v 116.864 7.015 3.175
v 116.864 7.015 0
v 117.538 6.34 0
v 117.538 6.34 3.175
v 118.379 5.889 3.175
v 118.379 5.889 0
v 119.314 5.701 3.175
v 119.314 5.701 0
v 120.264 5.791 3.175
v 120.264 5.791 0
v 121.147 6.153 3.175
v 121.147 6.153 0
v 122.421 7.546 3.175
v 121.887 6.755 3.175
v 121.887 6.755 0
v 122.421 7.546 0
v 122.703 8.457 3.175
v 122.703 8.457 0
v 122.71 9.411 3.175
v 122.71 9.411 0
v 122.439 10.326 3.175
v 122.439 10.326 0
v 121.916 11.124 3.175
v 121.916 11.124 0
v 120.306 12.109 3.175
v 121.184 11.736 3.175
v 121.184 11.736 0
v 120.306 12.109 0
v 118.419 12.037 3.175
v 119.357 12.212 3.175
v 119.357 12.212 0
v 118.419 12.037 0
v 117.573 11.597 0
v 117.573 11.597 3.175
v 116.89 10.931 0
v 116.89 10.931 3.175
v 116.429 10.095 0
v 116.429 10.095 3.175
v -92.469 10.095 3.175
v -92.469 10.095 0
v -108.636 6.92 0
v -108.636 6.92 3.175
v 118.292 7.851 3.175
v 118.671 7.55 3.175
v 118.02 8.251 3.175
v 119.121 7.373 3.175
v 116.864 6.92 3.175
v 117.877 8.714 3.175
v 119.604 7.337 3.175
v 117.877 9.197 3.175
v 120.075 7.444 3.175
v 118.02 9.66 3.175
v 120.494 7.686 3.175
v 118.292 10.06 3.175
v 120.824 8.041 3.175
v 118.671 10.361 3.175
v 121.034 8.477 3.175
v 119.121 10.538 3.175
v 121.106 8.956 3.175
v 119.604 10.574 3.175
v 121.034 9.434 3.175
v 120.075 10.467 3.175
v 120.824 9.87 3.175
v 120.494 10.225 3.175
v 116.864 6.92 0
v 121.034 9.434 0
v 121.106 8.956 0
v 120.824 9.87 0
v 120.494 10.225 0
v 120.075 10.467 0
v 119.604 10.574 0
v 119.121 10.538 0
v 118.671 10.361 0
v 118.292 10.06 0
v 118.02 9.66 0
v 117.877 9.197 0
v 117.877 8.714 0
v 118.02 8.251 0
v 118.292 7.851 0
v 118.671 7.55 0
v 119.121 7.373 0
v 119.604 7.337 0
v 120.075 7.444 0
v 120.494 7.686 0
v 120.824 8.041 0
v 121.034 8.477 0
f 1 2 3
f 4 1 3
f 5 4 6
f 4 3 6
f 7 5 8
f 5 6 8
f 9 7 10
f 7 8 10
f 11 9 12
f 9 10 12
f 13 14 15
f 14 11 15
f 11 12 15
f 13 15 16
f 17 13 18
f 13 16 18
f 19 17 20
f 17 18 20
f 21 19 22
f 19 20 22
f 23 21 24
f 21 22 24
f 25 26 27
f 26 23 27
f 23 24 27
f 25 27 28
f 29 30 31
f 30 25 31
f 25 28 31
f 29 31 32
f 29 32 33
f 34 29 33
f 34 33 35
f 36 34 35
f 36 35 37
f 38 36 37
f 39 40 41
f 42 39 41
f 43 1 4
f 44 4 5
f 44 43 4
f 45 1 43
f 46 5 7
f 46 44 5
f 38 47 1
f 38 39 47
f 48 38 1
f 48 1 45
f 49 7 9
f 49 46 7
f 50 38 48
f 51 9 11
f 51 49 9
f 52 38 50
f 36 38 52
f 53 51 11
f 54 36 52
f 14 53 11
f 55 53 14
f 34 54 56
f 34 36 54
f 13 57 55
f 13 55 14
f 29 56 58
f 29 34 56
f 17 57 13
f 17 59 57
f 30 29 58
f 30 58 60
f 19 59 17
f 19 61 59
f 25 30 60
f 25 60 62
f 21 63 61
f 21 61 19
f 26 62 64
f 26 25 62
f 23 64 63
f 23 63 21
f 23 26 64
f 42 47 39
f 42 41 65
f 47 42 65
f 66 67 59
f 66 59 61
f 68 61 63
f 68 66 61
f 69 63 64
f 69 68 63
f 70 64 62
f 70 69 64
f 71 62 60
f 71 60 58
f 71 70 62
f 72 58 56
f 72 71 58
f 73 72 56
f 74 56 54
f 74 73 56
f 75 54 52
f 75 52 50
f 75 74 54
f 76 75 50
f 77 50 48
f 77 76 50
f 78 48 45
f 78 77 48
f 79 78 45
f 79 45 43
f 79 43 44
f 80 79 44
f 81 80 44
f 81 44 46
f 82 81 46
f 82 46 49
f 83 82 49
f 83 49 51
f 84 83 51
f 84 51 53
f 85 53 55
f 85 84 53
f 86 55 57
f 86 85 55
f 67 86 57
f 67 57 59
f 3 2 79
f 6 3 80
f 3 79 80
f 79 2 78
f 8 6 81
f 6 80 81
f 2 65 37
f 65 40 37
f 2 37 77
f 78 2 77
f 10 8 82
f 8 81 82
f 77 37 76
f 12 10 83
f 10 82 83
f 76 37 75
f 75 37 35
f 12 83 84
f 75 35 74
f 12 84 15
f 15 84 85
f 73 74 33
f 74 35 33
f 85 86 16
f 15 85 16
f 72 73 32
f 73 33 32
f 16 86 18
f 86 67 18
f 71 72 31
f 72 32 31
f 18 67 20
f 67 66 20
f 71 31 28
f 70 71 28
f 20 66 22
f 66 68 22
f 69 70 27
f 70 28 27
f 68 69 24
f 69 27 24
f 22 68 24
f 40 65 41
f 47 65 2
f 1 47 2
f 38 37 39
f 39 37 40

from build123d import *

# Parameters (mm, degrees)
F1_DEPTH = 3.175
F2_R     = 3.259298
F2_R_2   = 1.623439
F3_DEPTH = 3.175


with BuildPart() as f1:
    # F0 (on Top) → F1 (new body)
    with BuildSketch(Plane.XY):
        Polygon((116.863699, 10.095269), (-92.469156, 10.095269), (-108.635934, 6.920269), (116.863699, 6.920269), align=None)
    extrude(amount=F1_DEPTH)

    # F2 (on Top) → F3 (join)
    with BuildSketch(Plane.XY):
        with Locations((119.482264, 8.955535)):
            Circle(F2_R)
        with Locations((119.482264, 8.955535)):
            Circle(F2_R_2, mode=Mode.SUBTRACT)
    extrude(amount=F3_DEPTH)


solid = f1.part
